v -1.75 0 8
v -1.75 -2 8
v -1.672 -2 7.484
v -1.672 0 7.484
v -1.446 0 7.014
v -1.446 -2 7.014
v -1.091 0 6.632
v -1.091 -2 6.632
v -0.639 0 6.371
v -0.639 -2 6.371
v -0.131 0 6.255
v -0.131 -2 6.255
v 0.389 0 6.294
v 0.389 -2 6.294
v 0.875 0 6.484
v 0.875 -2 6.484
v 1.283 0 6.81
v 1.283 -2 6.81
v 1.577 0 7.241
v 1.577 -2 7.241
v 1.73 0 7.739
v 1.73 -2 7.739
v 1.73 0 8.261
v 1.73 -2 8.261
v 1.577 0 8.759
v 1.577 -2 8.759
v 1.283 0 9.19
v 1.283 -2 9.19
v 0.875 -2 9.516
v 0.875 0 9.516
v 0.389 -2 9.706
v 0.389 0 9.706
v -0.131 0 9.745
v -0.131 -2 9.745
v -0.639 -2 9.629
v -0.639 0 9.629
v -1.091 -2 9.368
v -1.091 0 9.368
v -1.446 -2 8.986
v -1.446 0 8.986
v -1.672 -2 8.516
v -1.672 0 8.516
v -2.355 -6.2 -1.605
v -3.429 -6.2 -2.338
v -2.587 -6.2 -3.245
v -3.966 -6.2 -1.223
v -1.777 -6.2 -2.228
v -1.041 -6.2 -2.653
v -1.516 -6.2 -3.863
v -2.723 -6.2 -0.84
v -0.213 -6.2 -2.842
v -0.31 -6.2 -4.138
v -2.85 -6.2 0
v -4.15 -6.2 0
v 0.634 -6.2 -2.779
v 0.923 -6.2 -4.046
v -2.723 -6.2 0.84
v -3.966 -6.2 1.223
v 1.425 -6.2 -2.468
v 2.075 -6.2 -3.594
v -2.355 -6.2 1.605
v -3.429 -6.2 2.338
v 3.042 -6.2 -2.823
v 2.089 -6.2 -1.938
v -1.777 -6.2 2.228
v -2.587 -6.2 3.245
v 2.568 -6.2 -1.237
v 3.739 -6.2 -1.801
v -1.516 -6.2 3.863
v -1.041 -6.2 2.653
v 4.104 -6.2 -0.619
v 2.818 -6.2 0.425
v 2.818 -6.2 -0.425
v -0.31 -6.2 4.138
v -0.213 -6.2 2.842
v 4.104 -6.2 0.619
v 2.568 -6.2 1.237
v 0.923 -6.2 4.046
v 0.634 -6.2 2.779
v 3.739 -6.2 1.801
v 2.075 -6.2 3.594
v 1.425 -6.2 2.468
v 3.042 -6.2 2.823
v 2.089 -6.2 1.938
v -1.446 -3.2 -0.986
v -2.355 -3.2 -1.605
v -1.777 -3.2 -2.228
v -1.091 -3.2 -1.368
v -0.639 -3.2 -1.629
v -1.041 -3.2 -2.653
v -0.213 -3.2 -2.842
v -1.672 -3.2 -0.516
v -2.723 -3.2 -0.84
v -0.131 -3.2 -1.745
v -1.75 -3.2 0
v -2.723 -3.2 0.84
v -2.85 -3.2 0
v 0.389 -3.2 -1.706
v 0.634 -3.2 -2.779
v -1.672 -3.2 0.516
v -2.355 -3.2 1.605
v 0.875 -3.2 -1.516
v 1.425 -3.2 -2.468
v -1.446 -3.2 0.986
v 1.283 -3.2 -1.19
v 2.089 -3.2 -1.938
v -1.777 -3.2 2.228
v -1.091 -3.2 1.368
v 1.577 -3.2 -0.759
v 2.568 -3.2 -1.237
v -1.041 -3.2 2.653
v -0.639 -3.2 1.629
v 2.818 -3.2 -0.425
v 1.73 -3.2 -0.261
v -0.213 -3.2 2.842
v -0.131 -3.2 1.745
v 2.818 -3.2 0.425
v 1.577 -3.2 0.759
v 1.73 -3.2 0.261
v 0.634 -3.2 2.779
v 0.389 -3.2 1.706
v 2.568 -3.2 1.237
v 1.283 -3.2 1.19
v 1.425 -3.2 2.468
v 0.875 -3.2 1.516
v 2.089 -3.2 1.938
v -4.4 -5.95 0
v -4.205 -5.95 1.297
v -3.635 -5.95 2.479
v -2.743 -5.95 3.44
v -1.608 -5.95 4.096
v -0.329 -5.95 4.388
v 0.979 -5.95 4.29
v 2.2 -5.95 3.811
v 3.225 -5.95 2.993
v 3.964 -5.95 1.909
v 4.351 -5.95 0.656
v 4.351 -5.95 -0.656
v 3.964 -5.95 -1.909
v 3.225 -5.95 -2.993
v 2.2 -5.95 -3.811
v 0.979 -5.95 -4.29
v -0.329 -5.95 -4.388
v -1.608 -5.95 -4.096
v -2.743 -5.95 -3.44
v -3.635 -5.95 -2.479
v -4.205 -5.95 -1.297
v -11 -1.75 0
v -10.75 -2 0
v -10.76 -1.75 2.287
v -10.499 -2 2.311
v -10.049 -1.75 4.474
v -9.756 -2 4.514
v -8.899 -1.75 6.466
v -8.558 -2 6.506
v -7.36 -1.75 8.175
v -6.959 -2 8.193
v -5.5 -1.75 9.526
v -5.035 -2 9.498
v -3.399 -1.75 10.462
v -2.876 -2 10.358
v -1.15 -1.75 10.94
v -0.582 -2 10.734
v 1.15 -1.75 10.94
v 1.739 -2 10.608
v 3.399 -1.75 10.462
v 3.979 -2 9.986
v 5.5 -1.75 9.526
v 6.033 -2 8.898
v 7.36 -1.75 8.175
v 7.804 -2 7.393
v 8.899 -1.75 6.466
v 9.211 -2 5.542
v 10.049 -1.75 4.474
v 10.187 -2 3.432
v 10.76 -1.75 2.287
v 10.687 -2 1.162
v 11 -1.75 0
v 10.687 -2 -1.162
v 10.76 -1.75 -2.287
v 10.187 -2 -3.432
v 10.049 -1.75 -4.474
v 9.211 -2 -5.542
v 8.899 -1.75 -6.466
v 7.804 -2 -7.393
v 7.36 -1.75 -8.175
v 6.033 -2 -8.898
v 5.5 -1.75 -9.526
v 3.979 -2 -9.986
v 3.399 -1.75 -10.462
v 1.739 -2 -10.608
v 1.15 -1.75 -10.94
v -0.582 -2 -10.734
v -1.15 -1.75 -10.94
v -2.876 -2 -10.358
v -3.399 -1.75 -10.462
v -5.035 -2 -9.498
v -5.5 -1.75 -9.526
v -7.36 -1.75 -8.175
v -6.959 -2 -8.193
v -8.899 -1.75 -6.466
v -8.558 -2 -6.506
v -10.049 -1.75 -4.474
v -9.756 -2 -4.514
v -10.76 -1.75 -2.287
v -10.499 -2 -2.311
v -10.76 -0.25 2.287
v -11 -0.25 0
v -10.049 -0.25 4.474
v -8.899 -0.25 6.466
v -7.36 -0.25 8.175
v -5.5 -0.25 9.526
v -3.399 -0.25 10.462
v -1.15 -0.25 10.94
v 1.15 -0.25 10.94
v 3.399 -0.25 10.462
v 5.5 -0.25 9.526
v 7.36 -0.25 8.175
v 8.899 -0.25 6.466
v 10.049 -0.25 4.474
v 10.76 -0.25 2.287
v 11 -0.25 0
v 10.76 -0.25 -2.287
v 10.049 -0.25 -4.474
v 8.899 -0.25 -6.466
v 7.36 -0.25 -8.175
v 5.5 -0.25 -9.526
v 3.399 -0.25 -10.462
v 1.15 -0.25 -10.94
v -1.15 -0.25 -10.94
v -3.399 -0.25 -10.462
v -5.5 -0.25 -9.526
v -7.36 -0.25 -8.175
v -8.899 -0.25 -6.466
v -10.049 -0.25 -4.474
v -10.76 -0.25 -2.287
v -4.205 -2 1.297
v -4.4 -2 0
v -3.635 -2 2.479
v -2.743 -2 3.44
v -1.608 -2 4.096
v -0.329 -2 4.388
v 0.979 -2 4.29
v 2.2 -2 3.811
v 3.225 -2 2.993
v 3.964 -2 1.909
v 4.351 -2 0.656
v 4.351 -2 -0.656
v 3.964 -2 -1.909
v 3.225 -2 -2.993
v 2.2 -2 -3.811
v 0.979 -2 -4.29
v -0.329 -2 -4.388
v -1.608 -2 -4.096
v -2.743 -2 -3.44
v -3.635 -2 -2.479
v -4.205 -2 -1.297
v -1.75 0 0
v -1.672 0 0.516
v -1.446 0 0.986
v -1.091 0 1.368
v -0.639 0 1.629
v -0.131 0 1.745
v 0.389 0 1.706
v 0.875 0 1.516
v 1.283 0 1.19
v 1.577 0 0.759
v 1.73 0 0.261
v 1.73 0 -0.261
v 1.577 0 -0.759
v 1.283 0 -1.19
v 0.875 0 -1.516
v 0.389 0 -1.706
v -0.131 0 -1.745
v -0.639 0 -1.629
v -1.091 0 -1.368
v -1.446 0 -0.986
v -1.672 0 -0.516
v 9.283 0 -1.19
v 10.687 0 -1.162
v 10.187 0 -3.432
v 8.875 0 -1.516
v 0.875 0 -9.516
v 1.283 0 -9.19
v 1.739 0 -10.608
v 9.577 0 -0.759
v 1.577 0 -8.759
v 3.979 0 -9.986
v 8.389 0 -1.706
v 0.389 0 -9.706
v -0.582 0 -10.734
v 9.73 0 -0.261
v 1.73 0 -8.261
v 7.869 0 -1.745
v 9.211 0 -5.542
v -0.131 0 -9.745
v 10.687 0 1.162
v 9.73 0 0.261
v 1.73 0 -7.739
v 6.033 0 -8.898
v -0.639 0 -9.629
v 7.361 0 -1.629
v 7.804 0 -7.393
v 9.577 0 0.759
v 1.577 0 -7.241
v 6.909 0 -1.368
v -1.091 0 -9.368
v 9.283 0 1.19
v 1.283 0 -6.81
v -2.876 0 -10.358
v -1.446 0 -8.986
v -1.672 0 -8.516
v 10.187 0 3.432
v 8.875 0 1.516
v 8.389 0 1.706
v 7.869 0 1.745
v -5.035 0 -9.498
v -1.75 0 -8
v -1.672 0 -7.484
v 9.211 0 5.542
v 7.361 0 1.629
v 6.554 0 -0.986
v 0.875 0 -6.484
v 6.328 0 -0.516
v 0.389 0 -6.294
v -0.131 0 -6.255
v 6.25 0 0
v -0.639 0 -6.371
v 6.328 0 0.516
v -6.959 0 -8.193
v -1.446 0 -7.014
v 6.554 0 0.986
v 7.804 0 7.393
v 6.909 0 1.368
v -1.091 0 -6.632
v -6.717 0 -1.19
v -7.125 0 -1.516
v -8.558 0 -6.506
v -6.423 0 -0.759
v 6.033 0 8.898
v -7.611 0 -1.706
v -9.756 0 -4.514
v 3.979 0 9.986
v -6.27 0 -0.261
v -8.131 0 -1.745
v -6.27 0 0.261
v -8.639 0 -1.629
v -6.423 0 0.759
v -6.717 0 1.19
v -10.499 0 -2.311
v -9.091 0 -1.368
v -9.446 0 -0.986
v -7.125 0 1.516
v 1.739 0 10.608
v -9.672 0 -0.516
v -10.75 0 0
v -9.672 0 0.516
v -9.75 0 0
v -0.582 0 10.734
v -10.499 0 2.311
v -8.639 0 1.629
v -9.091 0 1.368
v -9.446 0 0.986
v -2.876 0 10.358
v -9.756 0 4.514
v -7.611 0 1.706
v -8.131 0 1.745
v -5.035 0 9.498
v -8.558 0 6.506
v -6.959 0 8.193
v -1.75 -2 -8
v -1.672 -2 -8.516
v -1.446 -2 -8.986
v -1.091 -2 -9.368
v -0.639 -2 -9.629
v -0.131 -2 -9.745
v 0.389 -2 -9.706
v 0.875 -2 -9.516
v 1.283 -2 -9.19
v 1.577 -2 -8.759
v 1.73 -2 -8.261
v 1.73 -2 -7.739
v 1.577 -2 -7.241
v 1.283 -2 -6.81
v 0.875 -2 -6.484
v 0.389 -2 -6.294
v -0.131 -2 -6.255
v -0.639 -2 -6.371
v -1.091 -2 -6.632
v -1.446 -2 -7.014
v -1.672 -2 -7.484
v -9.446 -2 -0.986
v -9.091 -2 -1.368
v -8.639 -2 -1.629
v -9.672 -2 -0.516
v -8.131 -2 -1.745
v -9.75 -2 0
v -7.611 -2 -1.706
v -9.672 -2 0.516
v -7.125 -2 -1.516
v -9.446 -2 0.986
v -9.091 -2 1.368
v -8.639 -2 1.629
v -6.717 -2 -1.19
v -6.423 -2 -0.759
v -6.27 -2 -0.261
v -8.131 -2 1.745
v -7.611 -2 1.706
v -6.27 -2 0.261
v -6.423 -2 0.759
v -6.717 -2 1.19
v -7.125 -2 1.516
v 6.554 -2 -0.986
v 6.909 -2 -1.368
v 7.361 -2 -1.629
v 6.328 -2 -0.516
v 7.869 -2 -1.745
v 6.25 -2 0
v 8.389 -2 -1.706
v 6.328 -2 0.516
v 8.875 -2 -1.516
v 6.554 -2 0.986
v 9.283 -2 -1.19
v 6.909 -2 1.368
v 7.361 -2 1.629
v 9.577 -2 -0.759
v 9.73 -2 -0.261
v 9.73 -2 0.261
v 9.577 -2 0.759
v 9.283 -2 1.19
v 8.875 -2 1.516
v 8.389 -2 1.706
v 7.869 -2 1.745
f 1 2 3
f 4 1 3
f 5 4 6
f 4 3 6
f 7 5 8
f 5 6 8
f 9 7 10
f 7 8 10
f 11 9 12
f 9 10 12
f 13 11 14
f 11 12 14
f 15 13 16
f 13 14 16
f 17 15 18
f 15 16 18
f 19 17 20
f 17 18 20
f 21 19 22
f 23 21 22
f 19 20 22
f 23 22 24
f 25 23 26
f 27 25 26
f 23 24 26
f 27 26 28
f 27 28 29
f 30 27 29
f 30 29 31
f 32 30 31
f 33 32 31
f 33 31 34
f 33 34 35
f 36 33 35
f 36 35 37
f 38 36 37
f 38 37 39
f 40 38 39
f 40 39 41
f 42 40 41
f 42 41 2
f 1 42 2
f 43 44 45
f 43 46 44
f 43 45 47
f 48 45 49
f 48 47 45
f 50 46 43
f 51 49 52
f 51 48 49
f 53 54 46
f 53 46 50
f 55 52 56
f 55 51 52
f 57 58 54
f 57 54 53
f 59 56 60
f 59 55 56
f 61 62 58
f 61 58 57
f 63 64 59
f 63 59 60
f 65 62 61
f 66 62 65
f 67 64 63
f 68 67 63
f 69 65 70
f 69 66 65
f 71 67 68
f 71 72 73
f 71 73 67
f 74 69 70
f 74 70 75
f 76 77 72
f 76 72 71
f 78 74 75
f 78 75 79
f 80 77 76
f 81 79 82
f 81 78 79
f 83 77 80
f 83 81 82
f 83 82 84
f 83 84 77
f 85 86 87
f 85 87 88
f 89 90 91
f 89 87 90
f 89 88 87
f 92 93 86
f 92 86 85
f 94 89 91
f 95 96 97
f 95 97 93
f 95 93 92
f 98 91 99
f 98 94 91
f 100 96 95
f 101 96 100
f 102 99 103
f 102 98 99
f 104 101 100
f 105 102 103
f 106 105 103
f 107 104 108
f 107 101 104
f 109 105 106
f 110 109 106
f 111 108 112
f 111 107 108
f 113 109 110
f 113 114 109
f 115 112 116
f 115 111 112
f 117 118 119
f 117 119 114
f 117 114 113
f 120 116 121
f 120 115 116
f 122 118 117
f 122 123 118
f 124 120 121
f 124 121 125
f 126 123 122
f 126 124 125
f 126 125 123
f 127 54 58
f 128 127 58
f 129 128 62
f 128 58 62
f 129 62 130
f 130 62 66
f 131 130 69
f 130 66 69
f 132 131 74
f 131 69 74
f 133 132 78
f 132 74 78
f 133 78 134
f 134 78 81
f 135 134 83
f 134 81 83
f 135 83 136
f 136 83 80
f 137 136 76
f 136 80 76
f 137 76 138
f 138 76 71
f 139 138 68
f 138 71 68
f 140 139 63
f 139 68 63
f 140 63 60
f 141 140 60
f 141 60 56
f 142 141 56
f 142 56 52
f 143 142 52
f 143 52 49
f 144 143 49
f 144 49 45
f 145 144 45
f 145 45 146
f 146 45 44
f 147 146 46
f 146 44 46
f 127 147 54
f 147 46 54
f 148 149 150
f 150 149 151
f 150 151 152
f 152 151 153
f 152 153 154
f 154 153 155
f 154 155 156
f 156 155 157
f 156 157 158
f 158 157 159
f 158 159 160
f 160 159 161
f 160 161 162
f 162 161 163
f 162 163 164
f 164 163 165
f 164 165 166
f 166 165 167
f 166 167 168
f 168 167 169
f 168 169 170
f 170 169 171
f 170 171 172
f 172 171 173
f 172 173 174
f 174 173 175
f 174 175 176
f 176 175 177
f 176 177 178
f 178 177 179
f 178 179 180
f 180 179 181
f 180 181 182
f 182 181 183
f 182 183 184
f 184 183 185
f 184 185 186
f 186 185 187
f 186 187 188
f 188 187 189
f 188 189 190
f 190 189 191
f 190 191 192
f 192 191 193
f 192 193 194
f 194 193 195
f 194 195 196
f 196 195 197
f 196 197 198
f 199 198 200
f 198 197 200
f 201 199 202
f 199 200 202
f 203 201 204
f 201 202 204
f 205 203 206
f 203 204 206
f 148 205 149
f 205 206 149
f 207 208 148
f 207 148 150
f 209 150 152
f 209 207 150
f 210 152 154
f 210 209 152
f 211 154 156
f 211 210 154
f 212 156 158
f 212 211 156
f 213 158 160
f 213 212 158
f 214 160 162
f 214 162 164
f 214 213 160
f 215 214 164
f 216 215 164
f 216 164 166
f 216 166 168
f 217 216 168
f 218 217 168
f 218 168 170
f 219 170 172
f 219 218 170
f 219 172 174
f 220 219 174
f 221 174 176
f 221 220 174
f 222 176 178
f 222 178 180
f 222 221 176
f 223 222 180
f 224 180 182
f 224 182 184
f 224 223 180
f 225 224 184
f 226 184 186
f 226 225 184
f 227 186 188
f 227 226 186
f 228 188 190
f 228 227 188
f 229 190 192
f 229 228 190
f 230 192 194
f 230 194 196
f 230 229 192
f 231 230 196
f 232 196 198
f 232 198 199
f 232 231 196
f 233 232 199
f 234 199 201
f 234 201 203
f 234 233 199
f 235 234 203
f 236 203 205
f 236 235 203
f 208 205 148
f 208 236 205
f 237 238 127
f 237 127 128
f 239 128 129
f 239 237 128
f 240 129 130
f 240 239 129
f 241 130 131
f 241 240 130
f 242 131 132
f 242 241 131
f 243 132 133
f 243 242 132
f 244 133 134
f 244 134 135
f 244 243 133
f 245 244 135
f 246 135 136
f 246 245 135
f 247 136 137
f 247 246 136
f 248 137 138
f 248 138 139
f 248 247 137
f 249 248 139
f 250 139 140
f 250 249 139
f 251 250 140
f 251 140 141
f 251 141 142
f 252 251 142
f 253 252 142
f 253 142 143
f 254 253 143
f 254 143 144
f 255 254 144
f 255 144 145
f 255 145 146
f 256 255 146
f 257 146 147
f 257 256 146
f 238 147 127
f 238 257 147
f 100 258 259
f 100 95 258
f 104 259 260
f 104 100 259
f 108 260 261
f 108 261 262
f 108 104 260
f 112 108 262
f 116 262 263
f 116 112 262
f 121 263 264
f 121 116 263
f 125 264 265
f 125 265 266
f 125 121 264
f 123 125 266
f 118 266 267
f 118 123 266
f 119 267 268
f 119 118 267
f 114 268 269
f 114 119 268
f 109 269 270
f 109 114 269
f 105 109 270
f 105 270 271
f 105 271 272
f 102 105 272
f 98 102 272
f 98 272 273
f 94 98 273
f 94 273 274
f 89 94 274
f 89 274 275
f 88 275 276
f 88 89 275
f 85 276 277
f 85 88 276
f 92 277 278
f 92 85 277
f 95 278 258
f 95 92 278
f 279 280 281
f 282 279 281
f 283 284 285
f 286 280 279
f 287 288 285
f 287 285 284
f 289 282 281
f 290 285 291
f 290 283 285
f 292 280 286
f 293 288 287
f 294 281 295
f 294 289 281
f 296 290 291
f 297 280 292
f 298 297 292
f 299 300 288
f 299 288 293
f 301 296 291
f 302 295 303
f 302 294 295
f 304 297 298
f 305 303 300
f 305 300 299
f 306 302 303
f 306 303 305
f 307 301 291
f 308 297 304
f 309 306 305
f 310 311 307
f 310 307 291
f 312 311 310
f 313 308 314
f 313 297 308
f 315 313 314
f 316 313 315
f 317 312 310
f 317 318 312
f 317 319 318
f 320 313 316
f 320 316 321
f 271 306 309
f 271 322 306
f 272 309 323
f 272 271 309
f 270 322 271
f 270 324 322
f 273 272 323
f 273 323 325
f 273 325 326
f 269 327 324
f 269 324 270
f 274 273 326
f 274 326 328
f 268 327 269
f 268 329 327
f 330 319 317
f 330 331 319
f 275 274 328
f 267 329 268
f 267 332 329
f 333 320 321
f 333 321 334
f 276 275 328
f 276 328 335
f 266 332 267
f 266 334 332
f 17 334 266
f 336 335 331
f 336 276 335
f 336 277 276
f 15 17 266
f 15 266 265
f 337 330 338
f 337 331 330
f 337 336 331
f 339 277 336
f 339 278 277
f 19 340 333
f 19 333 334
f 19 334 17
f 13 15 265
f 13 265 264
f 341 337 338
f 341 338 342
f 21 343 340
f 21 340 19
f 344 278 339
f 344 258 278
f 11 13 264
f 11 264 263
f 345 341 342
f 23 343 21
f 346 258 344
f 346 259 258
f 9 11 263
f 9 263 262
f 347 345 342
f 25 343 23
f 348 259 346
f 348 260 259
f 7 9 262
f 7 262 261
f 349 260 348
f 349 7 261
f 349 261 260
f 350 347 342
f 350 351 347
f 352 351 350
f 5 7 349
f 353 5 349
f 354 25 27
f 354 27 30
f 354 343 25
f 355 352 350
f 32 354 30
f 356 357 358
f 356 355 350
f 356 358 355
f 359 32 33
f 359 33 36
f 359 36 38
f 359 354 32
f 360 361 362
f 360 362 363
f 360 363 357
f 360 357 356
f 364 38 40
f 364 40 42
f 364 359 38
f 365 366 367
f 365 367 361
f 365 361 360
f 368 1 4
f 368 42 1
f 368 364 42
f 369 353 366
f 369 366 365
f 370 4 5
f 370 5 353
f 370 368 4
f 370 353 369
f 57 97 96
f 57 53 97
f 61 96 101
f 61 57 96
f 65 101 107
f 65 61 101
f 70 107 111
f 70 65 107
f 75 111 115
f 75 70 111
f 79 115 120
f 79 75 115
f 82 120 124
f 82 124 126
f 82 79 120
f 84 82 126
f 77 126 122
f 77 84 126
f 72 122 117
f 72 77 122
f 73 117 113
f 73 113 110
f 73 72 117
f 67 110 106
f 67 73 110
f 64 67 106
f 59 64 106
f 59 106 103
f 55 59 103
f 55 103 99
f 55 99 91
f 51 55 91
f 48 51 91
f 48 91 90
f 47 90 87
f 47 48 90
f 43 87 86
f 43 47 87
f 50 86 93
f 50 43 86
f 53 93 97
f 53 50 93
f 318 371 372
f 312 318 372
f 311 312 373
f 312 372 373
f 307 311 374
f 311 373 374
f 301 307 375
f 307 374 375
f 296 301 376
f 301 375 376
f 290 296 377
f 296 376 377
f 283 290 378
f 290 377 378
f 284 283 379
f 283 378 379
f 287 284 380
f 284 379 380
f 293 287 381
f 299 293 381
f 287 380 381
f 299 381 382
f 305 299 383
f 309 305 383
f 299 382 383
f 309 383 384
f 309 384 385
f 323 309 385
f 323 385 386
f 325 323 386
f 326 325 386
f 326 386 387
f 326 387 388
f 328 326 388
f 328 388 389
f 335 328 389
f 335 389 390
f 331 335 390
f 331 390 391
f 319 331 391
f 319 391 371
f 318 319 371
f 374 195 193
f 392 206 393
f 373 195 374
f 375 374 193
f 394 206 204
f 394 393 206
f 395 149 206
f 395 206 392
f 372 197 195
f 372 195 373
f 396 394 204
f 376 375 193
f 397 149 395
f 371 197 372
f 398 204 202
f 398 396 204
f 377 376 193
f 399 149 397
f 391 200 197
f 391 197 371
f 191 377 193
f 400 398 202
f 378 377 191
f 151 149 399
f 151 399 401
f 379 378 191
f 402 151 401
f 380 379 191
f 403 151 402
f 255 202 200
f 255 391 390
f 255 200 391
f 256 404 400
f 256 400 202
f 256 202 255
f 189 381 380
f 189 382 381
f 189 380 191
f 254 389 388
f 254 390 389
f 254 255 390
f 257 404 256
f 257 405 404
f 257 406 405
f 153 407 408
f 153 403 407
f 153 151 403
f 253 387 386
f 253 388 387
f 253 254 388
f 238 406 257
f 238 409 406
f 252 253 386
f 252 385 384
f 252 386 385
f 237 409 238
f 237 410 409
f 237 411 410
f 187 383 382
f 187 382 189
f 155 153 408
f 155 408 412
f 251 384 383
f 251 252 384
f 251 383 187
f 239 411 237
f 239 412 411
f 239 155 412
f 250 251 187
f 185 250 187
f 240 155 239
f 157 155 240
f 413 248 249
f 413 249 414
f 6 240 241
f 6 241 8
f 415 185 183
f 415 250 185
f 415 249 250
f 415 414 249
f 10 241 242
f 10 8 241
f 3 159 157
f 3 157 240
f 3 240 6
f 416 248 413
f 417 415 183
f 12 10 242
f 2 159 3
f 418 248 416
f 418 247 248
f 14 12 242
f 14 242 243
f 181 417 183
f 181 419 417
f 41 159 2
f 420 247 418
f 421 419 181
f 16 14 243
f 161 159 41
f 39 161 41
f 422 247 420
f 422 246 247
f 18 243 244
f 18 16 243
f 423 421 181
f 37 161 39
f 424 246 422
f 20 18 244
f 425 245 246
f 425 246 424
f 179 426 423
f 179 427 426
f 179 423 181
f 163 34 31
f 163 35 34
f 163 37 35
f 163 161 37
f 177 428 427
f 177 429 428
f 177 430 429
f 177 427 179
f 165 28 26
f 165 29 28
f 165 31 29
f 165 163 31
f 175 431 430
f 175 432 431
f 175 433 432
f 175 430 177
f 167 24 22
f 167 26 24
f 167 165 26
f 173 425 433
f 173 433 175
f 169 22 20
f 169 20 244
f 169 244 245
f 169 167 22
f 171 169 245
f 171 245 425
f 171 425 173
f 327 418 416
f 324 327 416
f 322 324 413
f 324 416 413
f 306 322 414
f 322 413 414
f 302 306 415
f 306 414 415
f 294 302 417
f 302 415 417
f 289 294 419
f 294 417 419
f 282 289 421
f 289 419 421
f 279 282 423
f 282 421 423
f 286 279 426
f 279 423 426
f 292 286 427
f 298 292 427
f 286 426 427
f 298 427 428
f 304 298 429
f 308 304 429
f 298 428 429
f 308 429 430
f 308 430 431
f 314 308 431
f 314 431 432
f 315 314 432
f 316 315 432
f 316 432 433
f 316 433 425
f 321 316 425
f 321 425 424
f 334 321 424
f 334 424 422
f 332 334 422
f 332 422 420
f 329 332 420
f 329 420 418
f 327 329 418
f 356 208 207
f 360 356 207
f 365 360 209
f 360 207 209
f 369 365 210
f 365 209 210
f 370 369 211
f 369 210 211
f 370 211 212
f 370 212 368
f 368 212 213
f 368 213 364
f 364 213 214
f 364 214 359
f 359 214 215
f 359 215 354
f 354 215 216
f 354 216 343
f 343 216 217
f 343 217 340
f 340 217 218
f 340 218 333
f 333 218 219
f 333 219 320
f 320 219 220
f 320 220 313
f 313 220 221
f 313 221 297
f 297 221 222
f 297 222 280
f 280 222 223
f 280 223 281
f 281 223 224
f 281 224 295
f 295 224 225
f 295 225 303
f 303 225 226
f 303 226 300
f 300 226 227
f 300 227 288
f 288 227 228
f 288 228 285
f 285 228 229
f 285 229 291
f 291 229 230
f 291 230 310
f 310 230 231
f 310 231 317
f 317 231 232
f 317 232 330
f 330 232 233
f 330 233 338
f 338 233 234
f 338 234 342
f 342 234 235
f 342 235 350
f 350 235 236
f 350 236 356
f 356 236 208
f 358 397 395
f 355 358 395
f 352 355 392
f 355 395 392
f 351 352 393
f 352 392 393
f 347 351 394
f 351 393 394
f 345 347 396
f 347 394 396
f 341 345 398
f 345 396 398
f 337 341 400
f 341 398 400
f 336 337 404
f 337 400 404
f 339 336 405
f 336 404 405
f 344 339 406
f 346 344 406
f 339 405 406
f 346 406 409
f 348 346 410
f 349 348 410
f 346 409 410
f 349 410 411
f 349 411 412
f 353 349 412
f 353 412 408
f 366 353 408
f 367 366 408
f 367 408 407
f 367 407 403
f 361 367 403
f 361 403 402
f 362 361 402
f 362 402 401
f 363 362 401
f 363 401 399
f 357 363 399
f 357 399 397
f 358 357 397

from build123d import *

# Parameters (mm, degrees)
F_3_5_3_5_DIAMETER_HOLE1_D = 3.5
CHAMFER1_SIZE              = 0.25


with BuildPart() as part:
    # Sketch2 → Revolve1 (revolve)
    with BuildSketch(Plane.XY):
        Polygon((-11, 0), (-1.75, 0), (-1.75, -3.2), (-2.85, -3.2), (-2.85, -6.2), (-4.4, -6.2), (-4.4, -2), (-11, -2), align=None)
    revolve(axis=Axis((0, 0, 0), (0, 1, 0)))

    # Ø3.5 (3.5) Diameter Hole1 (through all)
    with Locations(Plane(origin=(0, 0, 0), x_dir=(1, 0, 0), z_dir=(0, 1, 0))):
        with Locations((0, 8), (0, -8), (-8, 0), (8, 0)):
            Hole(F_3_5_3_5_DIAMETER_HOLE1_D / 2)

    # Chamfer1
    chamfer1_edges = [part.edges().sort_by_distance(p)[0] for p in [
        (11, 0, 0),
        (4.4, -6.2, 0),
        (11, -2, 0),
    ]]
    chamfer(chamfer1_edges, length=CHAMFER1_SIZE)


solid = part.part
